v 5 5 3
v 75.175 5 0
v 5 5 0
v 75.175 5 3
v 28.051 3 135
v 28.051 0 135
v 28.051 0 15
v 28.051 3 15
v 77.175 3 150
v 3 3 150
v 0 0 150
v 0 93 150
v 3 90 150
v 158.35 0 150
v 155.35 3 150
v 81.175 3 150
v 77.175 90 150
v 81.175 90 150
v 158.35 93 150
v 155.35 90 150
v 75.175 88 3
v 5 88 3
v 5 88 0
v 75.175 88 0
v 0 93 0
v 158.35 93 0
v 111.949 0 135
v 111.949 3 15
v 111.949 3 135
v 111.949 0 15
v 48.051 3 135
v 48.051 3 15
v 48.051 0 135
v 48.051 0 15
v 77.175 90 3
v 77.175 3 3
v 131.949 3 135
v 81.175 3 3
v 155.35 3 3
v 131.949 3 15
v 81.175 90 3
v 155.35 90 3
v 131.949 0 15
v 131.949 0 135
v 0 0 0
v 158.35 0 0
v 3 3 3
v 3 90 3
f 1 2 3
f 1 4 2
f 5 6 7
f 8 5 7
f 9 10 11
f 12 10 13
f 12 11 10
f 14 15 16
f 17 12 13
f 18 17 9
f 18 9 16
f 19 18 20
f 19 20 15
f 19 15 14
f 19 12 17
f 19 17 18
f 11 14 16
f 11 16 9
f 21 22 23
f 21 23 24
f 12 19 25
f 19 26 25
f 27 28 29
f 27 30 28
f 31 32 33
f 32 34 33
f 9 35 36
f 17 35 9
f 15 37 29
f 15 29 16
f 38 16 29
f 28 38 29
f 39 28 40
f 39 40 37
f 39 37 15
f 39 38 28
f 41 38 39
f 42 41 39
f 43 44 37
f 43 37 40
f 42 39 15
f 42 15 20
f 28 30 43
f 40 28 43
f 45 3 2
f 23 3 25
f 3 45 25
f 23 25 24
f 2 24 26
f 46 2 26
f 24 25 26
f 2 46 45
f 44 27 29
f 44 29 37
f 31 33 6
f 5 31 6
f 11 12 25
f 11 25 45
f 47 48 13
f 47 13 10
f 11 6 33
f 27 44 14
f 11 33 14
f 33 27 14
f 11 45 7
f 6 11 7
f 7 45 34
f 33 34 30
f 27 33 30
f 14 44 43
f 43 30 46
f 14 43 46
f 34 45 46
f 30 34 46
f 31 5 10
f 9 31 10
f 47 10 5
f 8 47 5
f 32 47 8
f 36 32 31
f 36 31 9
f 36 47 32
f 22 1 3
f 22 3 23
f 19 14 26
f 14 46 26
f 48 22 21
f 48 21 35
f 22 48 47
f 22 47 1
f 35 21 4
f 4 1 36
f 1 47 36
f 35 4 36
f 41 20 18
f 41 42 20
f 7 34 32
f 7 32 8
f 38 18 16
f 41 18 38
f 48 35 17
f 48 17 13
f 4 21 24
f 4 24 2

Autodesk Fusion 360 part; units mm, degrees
sketch "Szkic1" plane through (0, 0, 0) normal (0, 0, 1) x (1, 0, 0)
  line L0 (0, 0) -> (158.35, 0)
  line L1 (158.35, 0) -> (158.35, 93)
  line L2 (158.35, 93) -> (0, 93)
  line L3 (0, 93) -> (0, 0)
  line L4 (3, 5) -> (3, 3)
  line L5 (3, 3) -> (5, 3)
  line L6 (3, 3) -> (155.35, 3)
  line L7 (155.35, 3) -> (155.35, 90)
  line L8 (155.35, 90) -> (3, 90)
  line L9 (3, 90) -> (3, 3)
  dimension "d1" = 158.35
  dimension "d2" = 93
  dimension "d3" = 152.35
  dimension "d4" = 87
extrude "Wyciągnięcie proste1" add sketch "Szkic1" along normal blind 150
sketch "Szkic2" plane through (0, 90, 0) normal (0, -1, 0) x (1, 0, 0)
  line L0 (3, 0) -> (155.35, 0)
  line L1 (155.35, 0) -> (155.35, 150)
  line L2 (155.35, 150) -> (3, 150)
  line L3 (3, 150) -> (3, 0)
  line L4 (79.175, 150) -> (77.175, 150)
  line L5 (77.175, 150) -> (81.175, 150)
  line L6 (81.175, 150) -> (81.175, 0)
  line L7 (81.175, 0) -> (77.175, 0)
  line L8 (77.175, 0) -> (77.175, 150)
  dimension "d7" = 2
  dimension "d8" = 4
extrude "Wyciągnięcie proste2" add sketch "Szkic2" along normal blind 87 contours L0 L2 L4 L5 L6 L7 L8
sketch "Szkic3" plane through (0, 0, 0) normal (0, -1, 0) x (1, 0, 0)
  line L0 (0, 0) -> (158.35, 0)
  line L1 (158.35, 0) -> (158.35, 150)
  line L2 (158.35, 150) -> (0, 150)
  line L3 (0, 150) -> (0, 0)
sketch "Szkic4" plane through (0, 0, 0) normal (0, 0, -1) x (1, 0, 0)
  line L0 (81.175, -3) -> (155.35, -3)
  line L1 (155.35, -3) -> (155.35, -90)
  line L2 (155.35, -90) -> (81.175, -90)
  line L3 (81.175, -90) -> (81.175, -3)
  line L4 (77.175, -3) -> (77.175, -90)
  line L5 (77.175, -90) -> (3, -90)
  line L6 (3, -90) -> (3, -3)
  line L7 (3, -3) -> (77.175, -3)
  line L8 (0, 0) -> (0, -93)
  line L9 (0, -93) -> (158.35, -93)
  line L10 (158.35, -93) -> (158.35, 0)
  line L11 (158.35, 0) -> (0, 0)
  line L12 (0, 0) -> (158.35, 0)
  line L13 (158.35, 0) -> (158.35, -93)
  line L14 (158.35, -93) -> (0, -93)
  line L15 (0, -93) -> (0, 0)
extrude "Wyciągnięcie proste3" add sketch "Szkic4" against normal blind 3 contours L0 L1 L2 L3 | L4 L5 L6 L7
sketch "Szkic5" plane through (0, 0, 0) normal (0, -1, 0) x (1, 0, 0)
  line L0 (40, 15) -> (38.0507, 15)
  line L1 (38.0507, 15) -> (28.0507, 15)
  line L2 (28.0507, 15) -> (48.0507, 15)
  line L3 (48.0507, 15) -> (48.0507, 135)
  line L4 (48.0507, 135) -> (28.0507, 135)
  line L5 (28.0507, 135) -> (28.0507, 15)
  line L6 (131.9493, 135) -> (131.9493, 15)
  line L7 (120, 15) -> (121.9493, 15)
  line L8 (111.9493, 135) -> (131.9493, 135)
  line L9 (121.9493, 15) -> (131.9493, 15)
  line L10 (131.9493, 15) -> (111.9493, 15)
  line L11 (111.9493, 15) -> (111.9493, 135)
  dimension "d13" = 10
  dimension "d14" = 20
  dimension "d15" = 120
extrude "Wyciągnięcie proste4" cut sketch "Szkic5" against normal blind 10
sketch "Szkic6" plane through (0, 0, 3) normal (0, 0, 1) x (-1, 0, 0)
  line L0 (-3, -90) -> (-3, -3)
  line L1 (-3, -3) -> (-77.175, -3)
  line L2 (-77.175, -3) -> (-77.175, -90)
  line L3 (-77.175, -90) -> (-3, -90)
  line L4 (-77.175, -3) -> (-77.175, -90)
  line L5 (-77.175, -90) -> (-3, -90)
  line L6 (-3, -90) -> (-3, -3)
  line L7 (-3, -90) -> (-5, -90)
sketch "Szkic7" plane through (0, 0, 3) normal (0, 0, 1) x (-1, 0, 0)
  line L0 (-77.175, -90) -> (-77.175, -3)
  line L1 (-77.175, -3) -> (-77.175, -5)
  line L2 (-75.175, -5) -> (-5, -5)
  line L3 (-5, -5) -> (-5, -88)
  line L4 (-5, -88) -> (-75.175, -88)
  line L5 (-75.175, -88) -> (-75.175, -5)
  point P0 (-5, -90)
  point P1 (-77.175, -3)
  dimension "d18" = 2
extrude "Wyciągnięcie proste5" cut sketch "Szkic7" against normal blind 10
